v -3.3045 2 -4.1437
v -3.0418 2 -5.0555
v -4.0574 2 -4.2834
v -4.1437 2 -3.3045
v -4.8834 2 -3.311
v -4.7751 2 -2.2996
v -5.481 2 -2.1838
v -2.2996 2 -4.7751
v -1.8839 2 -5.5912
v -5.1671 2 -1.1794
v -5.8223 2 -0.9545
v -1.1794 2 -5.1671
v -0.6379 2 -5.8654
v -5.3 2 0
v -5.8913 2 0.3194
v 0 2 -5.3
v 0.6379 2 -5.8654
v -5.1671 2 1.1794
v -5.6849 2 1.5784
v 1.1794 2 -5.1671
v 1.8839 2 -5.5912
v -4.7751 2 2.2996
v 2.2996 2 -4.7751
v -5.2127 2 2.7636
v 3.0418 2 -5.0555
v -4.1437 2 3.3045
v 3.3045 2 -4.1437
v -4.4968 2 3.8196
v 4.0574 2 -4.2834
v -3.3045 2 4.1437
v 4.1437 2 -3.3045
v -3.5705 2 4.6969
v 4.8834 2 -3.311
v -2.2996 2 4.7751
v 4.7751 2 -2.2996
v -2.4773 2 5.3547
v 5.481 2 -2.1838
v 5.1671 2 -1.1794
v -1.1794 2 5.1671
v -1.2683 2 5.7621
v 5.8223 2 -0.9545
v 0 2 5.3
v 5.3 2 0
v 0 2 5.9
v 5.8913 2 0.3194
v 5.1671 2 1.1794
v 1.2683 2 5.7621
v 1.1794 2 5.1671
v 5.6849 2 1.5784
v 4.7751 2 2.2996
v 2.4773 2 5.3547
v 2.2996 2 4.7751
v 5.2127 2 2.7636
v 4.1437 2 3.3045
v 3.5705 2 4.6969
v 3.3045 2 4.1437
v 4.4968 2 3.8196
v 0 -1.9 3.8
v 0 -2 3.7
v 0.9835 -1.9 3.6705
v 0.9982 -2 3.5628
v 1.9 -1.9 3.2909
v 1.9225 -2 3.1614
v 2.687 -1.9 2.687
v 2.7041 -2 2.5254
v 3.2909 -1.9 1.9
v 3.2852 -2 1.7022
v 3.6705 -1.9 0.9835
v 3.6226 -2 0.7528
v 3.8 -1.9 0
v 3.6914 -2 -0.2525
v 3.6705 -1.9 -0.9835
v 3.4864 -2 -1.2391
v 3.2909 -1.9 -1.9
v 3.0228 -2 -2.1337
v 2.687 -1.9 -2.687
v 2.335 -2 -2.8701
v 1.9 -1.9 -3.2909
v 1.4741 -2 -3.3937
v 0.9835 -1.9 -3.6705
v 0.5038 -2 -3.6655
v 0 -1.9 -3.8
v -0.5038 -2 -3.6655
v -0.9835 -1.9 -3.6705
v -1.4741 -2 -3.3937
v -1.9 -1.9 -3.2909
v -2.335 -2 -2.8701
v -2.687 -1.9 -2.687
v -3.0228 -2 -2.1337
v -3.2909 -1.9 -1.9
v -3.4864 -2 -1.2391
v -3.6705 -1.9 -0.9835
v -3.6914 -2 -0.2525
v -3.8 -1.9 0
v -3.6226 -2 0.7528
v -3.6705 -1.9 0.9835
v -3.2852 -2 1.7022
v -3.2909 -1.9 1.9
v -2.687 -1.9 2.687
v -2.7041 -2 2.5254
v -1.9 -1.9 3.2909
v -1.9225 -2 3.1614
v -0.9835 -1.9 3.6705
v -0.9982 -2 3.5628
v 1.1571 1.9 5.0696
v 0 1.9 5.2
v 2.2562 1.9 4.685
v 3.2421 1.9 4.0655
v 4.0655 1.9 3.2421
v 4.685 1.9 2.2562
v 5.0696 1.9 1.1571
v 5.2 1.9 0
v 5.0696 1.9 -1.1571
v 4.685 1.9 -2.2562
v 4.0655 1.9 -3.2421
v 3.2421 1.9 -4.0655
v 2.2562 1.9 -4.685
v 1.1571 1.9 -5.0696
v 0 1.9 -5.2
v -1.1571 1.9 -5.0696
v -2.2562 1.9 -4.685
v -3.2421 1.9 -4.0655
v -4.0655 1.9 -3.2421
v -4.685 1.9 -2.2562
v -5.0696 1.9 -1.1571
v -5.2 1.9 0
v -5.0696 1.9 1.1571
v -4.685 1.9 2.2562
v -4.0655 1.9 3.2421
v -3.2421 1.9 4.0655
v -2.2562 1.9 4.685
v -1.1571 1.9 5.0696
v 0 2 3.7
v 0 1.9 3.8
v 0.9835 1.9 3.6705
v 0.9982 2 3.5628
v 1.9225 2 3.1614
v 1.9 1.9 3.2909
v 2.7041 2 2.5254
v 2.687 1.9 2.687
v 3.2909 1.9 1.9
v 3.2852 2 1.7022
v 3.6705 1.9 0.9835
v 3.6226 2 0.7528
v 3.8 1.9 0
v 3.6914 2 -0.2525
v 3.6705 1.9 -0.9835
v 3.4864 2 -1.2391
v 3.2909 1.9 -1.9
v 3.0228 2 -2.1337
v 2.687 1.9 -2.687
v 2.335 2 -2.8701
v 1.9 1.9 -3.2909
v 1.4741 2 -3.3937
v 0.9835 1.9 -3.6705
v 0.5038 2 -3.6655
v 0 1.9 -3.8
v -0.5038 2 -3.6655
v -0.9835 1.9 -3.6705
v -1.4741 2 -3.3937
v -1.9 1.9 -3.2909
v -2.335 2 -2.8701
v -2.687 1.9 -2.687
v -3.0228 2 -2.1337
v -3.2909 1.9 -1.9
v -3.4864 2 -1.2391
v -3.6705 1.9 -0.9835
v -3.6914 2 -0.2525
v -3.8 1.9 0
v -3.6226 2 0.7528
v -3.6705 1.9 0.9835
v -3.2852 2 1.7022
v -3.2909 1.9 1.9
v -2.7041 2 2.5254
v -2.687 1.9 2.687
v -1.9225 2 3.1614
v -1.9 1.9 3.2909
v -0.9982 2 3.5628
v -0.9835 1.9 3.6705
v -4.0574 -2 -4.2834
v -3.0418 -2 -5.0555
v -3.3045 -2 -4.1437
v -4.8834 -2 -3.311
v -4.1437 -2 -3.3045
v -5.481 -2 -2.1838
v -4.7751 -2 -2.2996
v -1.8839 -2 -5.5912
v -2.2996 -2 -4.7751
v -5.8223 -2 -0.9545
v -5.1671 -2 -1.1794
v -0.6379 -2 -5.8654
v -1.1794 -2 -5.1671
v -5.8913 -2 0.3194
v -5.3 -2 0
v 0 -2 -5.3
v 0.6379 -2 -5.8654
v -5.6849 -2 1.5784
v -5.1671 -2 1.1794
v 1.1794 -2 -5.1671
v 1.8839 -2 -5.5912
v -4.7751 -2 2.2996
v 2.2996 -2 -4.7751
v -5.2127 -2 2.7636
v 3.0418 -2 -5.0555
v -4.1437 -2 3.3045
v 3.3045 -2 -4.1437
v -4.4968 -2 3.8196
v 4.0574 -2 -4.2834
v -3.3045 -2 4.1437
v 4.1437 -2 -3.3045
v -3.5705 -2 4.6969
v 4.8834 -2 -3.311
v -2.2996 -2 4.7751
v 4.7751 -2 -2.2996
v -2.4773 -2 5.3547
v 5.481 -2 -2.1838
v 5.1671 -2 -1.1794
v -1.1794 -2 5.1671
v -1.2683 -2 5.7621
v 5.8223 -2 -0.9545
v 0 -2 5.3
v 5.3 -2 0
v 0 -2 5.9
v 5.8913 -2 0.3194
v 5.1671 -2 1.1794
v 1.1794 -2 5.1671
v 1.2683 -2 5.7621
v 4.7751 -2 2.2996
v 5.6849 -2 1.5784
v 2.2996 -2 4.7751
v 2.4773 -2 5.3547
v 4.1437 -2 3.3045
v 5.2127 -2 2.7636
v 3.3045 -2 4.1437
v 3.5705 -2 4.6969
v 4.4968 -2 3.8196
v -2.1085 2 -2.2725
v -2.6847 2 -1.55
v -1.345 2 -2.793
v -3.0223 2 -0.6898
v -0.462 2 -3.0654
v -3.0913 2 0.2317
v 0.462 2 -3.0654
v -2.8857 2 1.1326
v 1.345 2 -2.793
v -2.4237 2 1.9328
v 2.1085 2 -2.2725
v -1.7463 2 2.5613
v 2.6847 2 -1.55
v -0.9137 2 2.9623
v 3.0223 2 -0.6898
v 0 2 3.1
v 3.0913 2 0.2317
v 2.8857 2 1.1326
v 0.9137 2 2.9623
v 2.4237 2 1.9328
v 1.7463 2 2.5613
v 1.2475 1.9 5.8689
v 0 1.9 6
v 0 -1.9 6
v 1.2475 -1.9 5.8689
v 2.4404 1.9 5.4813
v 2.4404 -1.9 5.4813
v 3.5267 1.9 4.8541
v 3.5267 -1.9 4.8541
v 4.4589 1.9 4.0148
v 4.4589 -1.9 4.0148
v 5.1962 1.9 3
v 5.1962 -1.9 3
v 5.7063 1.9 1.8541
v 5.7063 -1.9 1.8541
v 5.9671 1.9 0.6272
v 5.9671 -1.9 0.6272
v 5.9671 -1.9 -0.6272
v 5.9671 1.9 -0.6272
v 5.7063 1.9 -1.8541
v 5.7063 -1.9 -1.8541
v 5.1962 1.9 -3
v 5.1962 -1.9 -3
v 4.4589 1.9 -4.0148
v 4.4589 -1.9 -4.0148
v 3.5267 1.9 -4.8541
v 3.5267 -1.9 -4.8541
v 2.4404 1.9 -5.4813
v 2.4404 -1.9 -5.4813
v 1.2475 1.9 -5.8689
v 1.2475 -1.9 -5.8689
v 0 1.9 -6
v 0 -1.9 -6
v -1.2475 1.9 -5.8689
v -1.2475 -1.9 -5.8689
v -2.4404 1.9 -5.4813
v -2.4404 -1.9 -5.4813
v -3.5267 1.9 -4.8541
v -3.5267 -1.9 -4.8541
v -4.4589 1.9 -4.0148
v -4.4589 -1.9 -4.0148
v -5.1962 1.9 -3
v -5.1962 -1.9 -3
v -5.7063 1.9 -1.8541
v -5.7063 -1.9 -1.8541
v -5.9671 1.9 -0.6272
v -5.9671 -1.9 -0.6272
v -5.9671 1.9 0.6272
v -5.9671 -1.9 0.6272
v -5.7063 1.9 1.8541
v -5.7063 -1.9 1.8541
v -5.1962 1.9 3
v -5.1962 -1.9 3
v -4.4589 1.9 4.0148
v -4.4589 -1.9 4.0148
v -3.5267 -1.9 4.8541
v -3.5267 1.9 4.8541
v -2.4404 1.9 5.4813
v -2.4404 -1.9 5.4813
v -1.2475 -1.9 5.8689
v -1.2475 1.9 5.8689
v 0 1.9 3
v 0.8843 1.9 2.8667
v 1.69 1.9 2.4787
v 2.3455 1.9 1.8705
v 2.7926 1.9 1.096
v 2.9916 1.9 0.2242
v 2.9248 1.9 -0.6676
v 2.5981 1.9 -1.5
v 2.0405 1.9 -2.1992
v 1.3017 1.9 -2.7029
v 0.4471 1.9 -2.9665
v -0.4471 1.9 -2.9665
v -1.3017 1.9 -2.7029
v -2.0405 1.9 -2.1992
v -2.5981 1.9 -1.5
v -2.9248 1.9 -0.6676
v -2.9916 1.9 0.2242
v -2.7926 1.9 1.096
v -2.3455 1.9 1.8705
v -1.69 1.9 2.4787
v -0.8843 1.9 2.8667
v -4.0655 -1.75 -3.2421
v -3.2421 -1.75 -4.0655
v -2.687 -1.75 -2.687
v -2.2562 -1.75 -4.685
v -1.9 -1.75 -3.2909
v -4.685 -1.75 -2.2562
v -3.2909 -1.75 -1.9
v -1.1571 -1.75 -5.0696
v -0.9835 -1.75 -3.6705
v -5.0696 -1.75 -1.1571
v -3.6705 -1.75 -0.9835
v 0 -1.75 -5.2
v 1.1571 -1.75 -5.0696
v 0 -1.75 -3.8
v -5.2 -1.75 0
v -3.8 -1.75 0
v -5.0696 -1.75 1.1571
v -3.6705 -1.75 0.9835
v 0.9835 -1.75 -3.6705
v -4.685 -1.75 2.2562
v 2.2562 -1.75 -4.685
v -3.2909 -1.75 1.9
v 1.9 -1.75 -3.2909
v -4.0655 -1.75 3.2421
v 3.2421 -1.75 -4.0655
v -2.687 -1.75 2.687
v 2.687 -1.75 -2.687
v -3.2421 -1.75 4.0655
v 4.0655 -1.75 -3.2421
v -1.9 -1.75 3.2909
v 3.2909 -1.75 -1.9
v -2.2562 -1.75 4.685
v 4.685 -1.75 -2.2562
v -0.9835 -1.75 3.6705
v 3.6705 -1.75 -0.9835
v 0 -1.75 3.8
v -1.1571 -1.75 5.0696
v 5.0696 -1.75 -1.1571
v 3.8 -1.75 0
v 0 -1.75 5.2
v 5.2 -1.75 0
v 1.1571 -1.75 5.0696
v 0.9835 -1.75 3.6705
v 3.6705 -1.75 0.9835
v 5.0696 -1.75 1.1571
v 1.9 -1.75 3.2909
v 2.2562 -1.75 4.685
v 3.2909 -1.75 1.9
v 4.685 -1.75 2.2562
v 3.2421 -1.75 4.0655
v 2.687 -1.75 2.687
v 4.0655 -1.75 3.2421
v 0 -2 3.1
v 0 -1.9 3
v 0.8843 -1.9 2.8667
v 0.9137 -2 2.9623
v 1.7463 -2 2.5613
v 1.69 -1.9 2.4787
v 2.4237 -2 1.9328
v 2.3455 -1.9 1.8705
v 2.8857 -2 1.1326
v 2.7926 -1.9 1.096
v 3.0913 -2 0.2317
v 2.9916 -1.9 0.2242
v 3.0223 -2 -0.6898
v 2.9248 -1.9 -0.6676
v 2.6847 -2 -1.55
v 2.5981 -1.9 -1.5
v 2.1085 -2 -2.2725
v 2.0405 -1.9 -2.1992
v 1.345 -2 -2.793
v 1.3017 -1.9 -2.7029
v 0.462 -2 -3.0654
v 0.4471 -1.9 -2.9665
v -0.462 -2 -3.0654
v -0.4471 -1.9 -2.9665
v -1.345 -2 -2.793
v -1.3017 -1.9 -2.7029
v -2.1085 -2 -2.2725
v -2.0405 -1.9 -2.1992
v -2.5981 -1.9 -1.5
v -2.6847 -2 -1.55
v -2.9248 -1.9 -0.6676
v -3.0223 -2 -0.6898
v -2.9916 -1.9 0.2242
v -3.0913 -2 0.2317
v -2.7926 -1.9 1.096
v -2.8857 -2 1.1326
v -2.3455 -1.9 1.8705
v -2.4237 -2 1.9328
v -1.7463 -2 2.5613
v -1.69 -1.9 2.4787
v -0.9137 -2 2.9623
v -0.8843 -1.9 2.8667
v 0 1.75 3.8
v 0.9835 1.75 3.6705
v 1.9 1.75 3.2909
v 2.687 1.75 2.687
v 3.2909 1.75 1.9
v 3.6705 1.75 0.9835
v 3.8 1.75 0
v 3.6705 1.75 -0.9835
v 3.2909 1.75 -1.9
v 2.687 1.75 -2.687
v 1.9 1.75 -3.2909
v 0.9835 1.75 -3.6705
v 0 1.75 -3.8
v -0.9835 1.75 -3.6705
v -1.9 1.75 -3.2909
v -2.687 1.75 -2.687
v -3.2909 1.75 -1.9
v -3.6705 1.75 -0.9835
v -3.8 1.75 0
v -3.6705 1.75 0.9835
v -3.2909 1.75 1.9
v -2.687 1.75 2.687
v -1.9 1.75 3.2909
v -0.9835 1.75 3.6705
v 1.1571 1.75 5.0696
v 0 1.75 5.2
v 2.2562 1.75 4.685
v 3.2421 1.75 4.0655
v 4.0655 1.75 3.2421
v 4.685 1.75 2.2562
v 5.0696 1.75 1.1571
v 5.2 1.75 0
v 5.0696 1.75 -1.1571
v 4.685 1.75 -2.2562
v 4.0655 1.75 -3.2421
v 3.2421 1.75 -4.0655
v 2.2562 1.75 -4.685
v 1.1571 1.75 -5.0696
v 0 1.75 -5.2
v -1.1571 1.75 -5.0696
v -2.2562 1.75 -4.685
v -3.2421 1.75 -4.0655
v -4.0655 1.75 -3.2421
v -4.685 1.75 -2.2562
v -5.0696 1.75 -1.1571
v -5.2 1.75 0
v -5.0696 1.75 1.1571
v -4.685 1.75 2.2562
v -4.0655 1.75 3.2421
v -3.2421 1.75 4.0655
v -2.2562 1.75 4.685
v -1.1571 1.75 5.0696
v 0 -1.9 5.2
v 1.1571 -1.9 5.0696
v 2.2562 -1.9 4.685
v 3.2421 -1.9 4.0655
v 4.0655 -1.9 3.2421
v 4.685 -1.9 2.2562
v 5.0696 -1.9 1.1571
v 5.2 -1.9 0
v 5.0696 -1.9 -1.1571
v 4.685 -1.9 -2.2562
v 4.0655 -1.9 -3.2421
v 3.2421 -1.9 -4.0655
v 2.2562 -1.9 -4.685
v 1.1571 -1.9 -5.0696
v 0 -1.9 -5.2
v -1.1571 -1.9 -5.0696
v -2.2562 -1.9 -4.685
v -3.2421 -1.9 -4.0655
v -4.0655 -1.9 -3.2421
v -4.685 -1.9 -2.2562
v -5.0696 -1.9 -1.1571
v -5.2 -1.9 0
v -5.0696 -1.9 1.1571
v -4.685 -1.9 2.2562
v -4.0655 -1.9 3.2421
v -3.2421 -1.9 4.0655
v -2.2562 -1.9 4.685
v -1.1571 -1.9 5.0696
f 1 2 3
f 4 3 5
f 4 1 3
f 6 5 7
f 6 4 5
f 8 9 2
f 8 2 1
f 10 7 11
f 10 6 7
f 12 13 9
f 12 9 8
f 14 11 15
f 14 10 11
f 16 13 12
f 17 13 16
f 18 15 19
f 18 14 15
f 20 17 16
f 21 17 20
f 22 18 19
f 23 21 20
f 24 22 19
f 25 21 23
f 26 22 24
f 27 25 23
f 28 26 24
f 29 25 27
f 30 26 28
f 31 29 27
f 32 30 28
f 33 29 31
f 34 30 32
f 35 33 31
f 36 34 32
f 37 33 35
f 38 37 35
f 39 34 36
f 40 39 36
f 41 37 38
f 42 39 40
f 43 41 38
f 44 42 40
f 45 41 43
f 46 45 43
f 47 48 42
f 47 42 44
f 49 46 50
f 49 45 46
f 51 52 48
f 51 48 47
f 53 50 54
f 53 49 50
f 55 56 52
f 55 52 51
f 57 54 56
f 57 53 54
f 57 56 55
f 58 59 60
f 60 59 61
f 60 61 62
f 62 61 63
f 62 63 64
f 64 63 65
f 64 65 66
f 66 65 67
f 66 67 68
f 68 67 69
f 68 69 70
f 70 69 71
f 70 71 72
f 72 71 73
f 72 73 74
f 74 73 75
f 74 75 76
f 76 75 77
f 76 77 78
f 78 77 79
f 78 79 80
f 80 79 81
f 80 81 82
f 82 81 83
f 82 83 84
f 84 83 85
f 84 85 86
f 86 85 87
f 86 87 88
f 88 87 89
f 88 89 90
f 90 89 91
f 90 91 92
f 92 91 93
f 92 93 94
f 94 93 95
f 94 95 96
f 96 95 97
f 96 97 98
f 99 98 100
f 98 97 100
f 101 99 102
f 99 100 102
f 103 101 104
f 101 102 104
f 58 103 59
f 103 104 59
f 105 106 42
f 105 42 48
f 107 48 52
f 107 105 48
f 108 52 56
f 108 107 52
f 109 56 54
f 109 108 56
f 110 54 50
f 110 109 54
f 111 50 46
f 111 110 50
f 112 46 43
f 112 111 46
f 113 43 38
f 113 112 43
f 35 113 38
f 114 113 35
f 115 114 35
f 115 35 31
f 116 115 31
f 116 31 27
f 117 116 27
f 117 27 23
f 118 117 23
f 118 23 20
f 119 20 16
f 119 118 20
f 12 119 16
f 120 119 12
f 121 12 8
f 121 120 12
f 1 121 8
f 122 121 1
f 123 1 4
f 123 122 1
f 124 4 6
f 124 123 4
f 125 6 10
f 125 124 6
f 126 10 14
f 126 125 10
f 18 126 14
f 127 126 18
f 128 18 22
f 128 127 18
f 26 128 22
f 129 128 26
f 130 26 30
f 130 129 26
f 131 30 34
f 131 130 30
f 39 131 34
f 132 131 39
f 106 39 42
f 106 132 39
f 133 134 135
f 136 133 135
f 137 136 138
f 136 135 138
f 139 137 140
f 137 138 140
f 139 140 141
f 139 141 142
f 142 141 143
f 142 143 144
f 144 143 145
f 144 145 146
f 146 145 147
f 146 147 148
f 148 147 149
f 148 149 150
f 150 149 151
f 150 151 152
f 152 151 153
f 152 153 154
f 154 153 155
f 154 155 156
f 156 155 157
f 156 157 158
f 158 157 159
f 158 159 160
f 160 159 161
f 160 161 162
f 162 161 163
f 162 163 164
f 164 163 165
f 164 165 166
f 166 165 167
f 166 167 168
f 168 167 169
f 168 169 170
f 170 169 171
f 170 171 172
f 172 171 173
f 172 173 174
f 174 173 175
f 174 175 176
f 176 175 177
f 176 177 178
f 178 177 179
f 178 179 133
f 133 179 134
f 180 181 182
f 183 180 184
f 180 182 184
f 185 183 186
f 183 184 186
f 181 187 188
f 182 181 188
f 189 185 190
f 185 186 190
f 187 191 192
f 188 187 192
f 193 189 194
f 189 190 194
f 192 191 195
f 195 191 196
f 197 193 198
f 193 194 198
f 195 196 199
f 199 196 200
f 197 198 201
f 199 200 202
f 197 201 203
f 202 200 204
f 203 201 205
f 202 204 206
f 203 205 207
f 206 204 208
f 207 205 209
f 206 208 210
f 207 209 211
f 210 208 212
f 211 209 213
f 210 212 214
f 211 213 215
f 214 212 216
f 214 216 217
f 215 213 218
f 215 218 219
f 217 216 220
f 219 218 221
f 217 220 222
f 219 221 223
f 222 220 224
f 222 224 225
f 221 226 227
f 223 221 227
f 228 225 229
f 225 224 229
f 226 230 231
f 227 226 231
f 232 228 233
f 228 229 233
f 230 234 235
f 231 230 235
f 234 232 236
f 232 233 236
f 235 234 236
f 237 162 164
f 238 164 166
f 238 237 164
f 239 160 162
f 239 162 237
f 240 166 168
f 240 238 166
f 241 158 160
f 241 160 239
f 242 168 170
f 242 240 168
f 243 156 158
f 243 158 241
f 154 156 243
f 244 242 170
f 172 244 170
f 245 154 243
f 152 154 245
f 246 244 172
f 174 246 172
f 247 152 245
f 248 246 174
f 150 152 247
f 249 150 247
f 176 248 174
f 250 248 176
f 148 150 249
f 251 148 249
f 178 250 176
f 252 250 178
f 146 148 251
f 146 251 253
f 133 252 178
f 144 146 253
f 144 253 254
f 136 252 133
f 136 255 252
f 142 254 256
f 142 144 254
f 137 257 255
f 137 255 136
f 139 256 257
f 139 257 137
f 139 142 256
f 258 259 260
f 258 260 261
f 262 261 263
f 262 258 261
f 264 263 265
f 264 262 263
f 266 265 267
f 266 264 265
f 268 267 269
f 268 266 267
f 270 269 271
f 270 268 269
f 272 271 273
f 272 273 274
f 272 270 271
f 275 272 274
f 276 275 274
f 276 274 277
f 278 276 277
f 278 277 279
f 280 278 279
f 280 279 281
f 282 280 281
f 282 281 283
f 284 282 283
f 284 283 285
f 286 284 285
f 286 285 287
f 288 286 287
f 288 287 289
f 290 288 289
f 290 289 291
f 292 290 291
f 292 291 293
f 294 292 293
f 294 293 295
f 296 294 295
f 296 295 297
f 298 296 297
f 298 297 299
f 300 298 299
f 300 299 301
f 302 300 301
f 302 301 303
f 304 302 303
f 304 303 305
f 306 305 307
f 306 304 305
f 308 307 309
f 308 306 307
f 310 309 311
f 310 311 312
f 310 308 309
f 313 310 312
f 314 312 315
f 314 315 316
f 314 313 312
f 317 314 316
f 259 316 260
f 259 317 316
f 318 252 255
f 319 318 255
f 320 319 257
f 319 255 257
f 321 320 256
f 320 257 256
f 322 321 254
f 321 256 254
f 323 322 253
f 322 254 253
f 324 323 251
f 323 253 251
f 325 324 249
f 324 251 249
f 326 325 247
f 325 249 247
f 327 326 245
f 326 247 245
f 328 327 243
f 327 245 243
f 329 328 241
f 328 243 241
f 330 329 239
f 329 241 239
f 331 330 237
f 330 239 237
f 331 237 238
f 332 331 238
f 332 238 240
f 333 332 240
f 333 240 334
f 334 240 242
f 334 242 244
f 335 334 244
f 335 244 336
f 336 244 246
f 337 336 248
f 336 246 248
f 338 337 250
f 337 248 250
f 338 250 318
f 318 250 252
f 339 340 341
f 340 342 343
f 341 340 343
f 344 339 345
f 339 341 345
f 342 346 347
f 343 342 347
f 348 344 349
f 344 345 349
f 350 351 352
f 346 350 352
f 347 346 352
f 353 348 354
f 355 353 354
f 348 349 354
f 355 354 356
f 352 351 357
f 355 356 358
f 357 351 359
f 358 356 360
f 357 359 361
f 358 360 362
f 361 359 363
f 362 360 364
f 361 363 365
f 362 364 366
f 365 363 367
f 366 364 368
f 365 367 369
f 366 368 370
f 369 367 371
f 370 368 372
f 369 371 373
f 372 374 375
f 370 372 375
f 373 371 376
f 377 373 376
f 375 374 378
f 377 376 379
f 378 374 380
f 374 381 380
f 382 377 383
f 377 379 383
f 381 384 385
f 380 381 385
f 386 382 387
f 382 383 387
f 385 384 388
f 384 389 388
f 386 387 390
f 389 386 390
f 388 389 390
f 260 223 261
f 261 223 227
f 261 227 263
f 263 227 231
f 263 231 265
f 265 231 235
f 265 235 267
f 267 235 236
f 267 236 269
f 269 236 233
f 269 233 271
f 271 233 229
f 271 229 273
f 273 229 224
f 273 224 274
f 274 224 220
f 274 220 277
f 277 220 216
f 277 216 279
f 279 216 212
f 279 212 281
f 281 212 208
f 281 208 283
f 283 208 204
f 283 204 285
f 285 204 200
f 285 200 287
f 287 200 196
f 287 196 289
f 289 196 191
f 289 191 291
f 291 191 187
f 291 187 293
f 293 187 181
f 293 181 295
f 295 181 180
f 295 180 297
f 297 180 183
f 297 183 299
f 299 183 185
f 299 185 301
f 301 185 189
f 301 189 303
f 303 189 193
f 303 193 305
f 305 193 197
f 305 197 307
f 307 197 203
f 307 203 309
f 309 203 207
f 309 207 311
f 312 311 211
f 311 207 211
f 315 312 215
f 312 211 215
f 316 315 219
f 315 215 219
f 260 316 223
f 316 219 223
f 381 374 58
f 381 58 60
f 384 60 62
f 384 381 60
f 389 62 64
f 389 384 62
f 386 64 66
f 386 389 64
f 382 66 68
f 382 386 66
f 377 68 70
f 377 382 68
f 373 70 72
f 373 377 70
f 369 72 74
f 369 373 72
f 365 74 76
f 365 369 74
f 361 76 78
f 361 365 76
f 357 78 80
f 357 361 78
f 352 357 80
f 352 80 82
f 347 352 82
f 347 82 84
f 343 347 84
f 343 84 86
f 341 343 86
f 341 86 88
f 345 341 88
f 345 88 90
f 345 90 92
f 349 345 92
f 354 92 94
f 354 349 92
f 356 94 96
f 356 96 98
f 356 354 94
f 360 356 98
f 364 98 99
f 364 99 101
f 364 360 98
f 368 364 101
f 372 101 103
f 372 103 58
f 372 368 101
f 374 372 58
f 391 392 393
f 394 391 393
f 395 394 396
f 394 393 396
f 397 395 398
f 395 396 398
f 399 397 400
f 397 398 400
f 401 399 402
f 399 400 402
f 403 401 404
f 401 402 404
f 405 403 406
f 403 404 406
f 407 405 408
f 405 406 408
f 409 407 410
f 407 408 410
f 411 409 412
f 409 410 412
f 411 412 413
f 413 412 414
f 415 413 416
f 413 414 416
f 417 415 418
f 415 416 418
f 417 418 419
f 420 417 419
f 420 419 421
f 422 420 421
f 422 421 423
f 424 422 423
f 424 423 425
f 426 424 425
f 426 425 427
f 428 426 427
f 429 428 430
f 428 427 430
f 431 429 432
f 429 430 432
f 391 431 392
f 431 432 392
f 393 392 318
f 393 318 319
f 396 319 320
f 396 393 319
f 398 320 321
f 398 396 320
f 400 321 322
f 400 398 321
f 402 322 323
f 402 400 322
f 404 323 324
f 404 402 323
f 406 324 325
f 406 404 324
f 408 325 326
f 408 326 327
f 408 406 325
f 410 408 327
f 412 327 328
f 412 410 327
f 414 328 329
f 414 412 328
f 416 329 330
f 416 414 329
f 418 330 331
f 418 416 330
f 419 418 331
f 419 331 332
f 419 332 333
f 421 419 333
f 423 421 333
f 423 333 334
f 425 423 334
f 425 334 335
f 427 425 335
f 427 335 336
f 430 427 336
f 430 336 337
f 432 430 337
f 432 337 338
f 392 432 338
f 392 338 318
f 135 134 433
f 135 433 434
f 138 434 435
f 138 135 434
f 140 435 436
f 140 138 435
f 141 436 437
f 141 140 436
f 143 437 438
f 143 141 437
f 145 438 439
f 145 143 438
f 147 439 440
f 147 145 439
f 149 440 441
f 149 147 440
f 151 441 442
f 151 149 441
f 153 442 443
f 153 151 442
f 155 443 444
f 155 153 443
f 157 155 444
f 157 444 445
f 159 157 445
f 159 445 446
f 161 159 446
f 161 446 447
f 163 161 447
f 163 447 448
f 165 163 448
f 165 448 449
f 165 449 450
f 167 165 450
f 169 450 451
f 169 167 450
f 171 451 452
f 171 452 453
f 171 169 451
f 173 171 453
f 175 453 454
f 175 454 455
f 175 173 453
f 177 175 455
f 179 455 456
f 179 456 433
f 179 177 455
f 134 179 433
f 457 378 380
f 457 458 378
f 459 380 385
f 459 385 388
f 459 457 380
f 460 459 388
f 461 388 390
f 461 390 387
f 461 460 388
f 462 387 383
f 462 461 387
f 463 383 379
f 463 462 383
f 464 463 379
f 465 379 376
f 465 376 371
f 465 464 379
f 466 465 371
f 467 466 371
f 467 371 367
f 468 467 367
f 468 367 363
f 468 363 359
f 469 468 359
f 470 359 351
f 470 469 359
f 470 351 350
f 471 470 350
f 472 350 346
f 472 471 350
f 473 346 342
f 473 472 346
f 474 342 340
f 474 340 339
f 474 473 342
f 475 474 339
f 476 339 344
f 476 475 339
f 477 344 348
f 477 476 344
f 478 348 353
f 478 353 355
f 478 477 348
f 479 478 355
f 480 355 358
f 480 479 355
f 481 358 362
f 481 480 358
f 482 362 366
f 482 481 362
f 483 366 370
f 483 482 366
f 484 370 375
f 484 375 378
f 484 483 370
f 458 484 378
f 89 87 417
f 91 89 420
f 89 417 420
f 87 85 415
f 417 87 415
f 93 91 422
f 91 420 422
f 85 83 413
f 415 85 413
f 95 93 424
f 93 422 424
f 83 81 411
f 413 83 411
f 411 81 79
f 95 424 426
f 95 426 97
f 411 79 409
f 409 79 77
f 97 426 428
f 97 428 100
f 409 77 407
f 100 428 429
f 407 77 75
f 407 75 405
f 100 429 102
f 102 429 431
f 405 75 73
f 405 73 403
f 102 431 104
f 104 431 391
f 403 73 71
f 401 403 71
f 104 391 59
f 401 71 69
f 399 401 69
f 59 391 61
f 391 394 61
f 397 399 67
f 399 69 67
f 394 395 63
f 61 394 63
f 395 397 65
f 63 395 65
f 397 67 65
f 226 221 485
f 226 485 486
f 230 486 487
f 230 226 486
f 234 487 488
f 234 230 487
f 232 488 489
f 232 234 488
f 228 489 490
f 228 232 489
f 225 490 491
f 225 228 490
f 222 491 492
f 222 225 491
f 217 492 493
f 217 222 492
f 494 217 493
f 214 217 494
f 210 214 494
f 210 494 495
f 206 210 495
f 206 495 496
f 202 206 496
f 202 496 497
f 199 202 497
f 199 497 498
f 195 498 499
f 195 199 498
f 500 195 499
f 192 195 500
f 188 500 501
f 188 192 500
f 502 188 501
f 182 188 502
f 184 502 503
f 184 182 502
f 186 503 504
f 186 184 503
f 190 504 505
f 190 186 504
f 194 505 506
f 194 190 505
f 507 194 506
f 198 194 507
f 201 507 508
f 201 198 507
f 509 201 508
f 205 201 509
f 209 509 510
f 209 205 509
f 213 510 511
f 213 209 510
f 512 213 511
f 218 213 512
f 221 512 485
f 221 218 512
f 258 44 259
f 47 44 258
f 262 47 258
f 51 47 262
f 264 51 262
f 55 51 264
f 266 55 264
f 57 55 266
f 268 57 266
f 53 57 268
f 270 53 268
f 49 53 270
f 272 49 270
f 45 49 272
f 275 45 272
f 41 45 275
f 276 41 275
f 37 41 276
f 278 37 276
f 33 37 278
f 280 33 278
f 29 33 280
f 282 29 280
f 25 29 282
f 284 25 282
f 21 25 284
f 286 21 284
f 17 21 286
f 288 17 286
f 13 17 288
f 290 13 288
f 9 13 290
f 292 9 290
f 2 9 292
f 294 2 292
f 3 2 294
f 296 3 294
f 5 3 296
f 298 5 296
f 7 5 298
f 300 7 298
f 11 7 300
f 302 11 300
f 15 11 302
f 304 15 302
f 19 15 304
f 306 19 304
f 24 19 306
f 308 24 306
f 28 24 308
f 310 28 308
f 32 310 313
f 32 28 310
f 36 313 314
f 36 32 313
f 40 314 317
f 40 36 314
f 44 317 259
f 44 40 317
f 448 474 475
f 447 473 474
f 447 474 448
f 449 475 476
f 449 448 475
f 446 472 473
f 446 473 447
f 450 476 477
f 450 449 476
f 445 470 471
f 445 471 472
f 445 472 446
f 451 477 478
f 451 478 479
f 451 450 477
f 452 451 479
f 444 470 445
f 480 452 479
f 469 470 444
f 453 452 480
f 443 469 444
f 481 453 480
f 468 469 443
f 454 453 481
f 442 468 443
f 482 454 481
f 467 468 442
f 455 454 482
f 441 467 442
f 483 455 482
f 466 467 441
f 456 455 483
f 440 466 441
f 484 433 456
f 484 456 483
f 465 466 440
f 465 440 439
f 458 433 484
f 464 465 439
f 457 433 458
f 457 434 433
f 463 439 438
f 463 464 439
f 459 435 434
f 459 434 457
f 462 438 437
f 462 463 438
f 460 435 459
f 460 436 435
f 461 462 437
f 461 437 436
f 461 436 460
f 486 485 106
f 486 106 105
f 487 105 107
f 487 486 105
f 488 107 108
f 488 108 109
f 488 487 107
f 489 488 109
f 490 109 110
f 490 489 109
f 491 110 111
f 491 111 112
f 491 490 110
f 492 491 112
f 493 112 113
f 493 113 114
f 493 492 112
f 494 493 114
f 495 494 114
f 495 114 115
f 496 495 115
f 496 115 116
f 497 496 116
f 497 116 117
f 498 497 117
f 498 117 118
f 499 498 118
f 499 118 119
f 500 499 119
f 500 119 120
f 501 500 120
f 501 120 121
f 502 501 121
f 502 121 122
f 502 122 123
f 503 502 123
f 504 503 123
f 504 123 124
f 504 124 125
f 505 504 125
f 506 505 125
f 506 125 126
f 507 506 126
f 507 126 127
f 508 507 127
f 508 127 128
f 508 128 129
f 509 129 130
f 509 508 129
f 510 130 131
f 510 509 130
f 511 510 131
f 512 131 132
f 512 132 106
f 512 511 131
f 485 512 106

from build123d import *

# Parameters (mm, degrees)
SKETCH1_R             = 6
SKETCH1_R_2           = 5.2
BOSS_EXTRUDE1_DEPTH   = 2
SKETCH1_R_3           = 3.8
SKETCH1_R_4           = 3
BOSS_EXTRUDE1_2_DEPTH = 2
SKETCH1_3_R           = 5.2
SKETCH1_3_R_2         = 3.8
BOSS_EXTRUDE2_DEPTH   = 1.75
CHAMFER2_SIZE         = 0.1
CHAMFER3_SIZE         = 0.1


with BuildPart() as part:
    # Sketch1 → Boss-Extrude1 (new, symmetric)
    with BuildSketch(Plane(origin=(0, 0, 0), x_dir=(1, 0, 0), z_dir=(0, 1, 0))):
        Circle(SKETCH1_R)
        Circle(SKETCH1_R_2, mode=Mode.SUBTRACT)
    extrude(amount=BOSS_EXTRUDE1_DEPTH, both=True)

    # Chamfer3
    chamfer3_edges = [part.edges().sort_by_distance(p)[0] for p in [
        (-5.2, 2, 0),
        (-6, 2, 0),
        (-5.2, -2, 0),
        (-6, -2, 0),
    ]]
    chamfer(chamfer3_edges, length=CHAMFER3_SIZE)


with BuildPart() as body_2:
    # Sketch1 → Boss-Extrude1 2 (new, symmetric)
    with BuildSketch(Plane(origin=(0, 0, 0), x_dir=(1, 0, 0), z_dir=(0, 1, 0))):
        Circle(SKETCH1_R_3)
        Circle(SKETCH1_R_4, mode=Mode.SUBTRACT)
    extrude(amount=BOSS_EXTRUDE1_2_DEPTH, both=True)

    # Sketch1<3> → Boss-Extrude2 (add, symmetric)
    with BuildSketch(Plane(origin=(0, 0, 0), x_dir=(1, 0, 0), z_dir=(0, 1, 0))):
        Circle(SKETCH1_3_R)
        Circle(SKETCH1_3_R_2, mode=Mode.SUBTRACT)
    extrude(amount=BOSS_EXTRUDE2_DEPTH, both=True)

    # Chamfer2
    chamfer2_edges = [body_2.edges().sort_by_distance(p)[0] for p in [
        (-3.8, -2, 0),
        (-3, -2, 0),
        (-3.8, 2, 0),
        (-3, 2, 0),
    ]]
    chamfer(chamfer2_edges, length=CHAMFER2_SIZE)


solid = Compound([part.part, body_2.part])
